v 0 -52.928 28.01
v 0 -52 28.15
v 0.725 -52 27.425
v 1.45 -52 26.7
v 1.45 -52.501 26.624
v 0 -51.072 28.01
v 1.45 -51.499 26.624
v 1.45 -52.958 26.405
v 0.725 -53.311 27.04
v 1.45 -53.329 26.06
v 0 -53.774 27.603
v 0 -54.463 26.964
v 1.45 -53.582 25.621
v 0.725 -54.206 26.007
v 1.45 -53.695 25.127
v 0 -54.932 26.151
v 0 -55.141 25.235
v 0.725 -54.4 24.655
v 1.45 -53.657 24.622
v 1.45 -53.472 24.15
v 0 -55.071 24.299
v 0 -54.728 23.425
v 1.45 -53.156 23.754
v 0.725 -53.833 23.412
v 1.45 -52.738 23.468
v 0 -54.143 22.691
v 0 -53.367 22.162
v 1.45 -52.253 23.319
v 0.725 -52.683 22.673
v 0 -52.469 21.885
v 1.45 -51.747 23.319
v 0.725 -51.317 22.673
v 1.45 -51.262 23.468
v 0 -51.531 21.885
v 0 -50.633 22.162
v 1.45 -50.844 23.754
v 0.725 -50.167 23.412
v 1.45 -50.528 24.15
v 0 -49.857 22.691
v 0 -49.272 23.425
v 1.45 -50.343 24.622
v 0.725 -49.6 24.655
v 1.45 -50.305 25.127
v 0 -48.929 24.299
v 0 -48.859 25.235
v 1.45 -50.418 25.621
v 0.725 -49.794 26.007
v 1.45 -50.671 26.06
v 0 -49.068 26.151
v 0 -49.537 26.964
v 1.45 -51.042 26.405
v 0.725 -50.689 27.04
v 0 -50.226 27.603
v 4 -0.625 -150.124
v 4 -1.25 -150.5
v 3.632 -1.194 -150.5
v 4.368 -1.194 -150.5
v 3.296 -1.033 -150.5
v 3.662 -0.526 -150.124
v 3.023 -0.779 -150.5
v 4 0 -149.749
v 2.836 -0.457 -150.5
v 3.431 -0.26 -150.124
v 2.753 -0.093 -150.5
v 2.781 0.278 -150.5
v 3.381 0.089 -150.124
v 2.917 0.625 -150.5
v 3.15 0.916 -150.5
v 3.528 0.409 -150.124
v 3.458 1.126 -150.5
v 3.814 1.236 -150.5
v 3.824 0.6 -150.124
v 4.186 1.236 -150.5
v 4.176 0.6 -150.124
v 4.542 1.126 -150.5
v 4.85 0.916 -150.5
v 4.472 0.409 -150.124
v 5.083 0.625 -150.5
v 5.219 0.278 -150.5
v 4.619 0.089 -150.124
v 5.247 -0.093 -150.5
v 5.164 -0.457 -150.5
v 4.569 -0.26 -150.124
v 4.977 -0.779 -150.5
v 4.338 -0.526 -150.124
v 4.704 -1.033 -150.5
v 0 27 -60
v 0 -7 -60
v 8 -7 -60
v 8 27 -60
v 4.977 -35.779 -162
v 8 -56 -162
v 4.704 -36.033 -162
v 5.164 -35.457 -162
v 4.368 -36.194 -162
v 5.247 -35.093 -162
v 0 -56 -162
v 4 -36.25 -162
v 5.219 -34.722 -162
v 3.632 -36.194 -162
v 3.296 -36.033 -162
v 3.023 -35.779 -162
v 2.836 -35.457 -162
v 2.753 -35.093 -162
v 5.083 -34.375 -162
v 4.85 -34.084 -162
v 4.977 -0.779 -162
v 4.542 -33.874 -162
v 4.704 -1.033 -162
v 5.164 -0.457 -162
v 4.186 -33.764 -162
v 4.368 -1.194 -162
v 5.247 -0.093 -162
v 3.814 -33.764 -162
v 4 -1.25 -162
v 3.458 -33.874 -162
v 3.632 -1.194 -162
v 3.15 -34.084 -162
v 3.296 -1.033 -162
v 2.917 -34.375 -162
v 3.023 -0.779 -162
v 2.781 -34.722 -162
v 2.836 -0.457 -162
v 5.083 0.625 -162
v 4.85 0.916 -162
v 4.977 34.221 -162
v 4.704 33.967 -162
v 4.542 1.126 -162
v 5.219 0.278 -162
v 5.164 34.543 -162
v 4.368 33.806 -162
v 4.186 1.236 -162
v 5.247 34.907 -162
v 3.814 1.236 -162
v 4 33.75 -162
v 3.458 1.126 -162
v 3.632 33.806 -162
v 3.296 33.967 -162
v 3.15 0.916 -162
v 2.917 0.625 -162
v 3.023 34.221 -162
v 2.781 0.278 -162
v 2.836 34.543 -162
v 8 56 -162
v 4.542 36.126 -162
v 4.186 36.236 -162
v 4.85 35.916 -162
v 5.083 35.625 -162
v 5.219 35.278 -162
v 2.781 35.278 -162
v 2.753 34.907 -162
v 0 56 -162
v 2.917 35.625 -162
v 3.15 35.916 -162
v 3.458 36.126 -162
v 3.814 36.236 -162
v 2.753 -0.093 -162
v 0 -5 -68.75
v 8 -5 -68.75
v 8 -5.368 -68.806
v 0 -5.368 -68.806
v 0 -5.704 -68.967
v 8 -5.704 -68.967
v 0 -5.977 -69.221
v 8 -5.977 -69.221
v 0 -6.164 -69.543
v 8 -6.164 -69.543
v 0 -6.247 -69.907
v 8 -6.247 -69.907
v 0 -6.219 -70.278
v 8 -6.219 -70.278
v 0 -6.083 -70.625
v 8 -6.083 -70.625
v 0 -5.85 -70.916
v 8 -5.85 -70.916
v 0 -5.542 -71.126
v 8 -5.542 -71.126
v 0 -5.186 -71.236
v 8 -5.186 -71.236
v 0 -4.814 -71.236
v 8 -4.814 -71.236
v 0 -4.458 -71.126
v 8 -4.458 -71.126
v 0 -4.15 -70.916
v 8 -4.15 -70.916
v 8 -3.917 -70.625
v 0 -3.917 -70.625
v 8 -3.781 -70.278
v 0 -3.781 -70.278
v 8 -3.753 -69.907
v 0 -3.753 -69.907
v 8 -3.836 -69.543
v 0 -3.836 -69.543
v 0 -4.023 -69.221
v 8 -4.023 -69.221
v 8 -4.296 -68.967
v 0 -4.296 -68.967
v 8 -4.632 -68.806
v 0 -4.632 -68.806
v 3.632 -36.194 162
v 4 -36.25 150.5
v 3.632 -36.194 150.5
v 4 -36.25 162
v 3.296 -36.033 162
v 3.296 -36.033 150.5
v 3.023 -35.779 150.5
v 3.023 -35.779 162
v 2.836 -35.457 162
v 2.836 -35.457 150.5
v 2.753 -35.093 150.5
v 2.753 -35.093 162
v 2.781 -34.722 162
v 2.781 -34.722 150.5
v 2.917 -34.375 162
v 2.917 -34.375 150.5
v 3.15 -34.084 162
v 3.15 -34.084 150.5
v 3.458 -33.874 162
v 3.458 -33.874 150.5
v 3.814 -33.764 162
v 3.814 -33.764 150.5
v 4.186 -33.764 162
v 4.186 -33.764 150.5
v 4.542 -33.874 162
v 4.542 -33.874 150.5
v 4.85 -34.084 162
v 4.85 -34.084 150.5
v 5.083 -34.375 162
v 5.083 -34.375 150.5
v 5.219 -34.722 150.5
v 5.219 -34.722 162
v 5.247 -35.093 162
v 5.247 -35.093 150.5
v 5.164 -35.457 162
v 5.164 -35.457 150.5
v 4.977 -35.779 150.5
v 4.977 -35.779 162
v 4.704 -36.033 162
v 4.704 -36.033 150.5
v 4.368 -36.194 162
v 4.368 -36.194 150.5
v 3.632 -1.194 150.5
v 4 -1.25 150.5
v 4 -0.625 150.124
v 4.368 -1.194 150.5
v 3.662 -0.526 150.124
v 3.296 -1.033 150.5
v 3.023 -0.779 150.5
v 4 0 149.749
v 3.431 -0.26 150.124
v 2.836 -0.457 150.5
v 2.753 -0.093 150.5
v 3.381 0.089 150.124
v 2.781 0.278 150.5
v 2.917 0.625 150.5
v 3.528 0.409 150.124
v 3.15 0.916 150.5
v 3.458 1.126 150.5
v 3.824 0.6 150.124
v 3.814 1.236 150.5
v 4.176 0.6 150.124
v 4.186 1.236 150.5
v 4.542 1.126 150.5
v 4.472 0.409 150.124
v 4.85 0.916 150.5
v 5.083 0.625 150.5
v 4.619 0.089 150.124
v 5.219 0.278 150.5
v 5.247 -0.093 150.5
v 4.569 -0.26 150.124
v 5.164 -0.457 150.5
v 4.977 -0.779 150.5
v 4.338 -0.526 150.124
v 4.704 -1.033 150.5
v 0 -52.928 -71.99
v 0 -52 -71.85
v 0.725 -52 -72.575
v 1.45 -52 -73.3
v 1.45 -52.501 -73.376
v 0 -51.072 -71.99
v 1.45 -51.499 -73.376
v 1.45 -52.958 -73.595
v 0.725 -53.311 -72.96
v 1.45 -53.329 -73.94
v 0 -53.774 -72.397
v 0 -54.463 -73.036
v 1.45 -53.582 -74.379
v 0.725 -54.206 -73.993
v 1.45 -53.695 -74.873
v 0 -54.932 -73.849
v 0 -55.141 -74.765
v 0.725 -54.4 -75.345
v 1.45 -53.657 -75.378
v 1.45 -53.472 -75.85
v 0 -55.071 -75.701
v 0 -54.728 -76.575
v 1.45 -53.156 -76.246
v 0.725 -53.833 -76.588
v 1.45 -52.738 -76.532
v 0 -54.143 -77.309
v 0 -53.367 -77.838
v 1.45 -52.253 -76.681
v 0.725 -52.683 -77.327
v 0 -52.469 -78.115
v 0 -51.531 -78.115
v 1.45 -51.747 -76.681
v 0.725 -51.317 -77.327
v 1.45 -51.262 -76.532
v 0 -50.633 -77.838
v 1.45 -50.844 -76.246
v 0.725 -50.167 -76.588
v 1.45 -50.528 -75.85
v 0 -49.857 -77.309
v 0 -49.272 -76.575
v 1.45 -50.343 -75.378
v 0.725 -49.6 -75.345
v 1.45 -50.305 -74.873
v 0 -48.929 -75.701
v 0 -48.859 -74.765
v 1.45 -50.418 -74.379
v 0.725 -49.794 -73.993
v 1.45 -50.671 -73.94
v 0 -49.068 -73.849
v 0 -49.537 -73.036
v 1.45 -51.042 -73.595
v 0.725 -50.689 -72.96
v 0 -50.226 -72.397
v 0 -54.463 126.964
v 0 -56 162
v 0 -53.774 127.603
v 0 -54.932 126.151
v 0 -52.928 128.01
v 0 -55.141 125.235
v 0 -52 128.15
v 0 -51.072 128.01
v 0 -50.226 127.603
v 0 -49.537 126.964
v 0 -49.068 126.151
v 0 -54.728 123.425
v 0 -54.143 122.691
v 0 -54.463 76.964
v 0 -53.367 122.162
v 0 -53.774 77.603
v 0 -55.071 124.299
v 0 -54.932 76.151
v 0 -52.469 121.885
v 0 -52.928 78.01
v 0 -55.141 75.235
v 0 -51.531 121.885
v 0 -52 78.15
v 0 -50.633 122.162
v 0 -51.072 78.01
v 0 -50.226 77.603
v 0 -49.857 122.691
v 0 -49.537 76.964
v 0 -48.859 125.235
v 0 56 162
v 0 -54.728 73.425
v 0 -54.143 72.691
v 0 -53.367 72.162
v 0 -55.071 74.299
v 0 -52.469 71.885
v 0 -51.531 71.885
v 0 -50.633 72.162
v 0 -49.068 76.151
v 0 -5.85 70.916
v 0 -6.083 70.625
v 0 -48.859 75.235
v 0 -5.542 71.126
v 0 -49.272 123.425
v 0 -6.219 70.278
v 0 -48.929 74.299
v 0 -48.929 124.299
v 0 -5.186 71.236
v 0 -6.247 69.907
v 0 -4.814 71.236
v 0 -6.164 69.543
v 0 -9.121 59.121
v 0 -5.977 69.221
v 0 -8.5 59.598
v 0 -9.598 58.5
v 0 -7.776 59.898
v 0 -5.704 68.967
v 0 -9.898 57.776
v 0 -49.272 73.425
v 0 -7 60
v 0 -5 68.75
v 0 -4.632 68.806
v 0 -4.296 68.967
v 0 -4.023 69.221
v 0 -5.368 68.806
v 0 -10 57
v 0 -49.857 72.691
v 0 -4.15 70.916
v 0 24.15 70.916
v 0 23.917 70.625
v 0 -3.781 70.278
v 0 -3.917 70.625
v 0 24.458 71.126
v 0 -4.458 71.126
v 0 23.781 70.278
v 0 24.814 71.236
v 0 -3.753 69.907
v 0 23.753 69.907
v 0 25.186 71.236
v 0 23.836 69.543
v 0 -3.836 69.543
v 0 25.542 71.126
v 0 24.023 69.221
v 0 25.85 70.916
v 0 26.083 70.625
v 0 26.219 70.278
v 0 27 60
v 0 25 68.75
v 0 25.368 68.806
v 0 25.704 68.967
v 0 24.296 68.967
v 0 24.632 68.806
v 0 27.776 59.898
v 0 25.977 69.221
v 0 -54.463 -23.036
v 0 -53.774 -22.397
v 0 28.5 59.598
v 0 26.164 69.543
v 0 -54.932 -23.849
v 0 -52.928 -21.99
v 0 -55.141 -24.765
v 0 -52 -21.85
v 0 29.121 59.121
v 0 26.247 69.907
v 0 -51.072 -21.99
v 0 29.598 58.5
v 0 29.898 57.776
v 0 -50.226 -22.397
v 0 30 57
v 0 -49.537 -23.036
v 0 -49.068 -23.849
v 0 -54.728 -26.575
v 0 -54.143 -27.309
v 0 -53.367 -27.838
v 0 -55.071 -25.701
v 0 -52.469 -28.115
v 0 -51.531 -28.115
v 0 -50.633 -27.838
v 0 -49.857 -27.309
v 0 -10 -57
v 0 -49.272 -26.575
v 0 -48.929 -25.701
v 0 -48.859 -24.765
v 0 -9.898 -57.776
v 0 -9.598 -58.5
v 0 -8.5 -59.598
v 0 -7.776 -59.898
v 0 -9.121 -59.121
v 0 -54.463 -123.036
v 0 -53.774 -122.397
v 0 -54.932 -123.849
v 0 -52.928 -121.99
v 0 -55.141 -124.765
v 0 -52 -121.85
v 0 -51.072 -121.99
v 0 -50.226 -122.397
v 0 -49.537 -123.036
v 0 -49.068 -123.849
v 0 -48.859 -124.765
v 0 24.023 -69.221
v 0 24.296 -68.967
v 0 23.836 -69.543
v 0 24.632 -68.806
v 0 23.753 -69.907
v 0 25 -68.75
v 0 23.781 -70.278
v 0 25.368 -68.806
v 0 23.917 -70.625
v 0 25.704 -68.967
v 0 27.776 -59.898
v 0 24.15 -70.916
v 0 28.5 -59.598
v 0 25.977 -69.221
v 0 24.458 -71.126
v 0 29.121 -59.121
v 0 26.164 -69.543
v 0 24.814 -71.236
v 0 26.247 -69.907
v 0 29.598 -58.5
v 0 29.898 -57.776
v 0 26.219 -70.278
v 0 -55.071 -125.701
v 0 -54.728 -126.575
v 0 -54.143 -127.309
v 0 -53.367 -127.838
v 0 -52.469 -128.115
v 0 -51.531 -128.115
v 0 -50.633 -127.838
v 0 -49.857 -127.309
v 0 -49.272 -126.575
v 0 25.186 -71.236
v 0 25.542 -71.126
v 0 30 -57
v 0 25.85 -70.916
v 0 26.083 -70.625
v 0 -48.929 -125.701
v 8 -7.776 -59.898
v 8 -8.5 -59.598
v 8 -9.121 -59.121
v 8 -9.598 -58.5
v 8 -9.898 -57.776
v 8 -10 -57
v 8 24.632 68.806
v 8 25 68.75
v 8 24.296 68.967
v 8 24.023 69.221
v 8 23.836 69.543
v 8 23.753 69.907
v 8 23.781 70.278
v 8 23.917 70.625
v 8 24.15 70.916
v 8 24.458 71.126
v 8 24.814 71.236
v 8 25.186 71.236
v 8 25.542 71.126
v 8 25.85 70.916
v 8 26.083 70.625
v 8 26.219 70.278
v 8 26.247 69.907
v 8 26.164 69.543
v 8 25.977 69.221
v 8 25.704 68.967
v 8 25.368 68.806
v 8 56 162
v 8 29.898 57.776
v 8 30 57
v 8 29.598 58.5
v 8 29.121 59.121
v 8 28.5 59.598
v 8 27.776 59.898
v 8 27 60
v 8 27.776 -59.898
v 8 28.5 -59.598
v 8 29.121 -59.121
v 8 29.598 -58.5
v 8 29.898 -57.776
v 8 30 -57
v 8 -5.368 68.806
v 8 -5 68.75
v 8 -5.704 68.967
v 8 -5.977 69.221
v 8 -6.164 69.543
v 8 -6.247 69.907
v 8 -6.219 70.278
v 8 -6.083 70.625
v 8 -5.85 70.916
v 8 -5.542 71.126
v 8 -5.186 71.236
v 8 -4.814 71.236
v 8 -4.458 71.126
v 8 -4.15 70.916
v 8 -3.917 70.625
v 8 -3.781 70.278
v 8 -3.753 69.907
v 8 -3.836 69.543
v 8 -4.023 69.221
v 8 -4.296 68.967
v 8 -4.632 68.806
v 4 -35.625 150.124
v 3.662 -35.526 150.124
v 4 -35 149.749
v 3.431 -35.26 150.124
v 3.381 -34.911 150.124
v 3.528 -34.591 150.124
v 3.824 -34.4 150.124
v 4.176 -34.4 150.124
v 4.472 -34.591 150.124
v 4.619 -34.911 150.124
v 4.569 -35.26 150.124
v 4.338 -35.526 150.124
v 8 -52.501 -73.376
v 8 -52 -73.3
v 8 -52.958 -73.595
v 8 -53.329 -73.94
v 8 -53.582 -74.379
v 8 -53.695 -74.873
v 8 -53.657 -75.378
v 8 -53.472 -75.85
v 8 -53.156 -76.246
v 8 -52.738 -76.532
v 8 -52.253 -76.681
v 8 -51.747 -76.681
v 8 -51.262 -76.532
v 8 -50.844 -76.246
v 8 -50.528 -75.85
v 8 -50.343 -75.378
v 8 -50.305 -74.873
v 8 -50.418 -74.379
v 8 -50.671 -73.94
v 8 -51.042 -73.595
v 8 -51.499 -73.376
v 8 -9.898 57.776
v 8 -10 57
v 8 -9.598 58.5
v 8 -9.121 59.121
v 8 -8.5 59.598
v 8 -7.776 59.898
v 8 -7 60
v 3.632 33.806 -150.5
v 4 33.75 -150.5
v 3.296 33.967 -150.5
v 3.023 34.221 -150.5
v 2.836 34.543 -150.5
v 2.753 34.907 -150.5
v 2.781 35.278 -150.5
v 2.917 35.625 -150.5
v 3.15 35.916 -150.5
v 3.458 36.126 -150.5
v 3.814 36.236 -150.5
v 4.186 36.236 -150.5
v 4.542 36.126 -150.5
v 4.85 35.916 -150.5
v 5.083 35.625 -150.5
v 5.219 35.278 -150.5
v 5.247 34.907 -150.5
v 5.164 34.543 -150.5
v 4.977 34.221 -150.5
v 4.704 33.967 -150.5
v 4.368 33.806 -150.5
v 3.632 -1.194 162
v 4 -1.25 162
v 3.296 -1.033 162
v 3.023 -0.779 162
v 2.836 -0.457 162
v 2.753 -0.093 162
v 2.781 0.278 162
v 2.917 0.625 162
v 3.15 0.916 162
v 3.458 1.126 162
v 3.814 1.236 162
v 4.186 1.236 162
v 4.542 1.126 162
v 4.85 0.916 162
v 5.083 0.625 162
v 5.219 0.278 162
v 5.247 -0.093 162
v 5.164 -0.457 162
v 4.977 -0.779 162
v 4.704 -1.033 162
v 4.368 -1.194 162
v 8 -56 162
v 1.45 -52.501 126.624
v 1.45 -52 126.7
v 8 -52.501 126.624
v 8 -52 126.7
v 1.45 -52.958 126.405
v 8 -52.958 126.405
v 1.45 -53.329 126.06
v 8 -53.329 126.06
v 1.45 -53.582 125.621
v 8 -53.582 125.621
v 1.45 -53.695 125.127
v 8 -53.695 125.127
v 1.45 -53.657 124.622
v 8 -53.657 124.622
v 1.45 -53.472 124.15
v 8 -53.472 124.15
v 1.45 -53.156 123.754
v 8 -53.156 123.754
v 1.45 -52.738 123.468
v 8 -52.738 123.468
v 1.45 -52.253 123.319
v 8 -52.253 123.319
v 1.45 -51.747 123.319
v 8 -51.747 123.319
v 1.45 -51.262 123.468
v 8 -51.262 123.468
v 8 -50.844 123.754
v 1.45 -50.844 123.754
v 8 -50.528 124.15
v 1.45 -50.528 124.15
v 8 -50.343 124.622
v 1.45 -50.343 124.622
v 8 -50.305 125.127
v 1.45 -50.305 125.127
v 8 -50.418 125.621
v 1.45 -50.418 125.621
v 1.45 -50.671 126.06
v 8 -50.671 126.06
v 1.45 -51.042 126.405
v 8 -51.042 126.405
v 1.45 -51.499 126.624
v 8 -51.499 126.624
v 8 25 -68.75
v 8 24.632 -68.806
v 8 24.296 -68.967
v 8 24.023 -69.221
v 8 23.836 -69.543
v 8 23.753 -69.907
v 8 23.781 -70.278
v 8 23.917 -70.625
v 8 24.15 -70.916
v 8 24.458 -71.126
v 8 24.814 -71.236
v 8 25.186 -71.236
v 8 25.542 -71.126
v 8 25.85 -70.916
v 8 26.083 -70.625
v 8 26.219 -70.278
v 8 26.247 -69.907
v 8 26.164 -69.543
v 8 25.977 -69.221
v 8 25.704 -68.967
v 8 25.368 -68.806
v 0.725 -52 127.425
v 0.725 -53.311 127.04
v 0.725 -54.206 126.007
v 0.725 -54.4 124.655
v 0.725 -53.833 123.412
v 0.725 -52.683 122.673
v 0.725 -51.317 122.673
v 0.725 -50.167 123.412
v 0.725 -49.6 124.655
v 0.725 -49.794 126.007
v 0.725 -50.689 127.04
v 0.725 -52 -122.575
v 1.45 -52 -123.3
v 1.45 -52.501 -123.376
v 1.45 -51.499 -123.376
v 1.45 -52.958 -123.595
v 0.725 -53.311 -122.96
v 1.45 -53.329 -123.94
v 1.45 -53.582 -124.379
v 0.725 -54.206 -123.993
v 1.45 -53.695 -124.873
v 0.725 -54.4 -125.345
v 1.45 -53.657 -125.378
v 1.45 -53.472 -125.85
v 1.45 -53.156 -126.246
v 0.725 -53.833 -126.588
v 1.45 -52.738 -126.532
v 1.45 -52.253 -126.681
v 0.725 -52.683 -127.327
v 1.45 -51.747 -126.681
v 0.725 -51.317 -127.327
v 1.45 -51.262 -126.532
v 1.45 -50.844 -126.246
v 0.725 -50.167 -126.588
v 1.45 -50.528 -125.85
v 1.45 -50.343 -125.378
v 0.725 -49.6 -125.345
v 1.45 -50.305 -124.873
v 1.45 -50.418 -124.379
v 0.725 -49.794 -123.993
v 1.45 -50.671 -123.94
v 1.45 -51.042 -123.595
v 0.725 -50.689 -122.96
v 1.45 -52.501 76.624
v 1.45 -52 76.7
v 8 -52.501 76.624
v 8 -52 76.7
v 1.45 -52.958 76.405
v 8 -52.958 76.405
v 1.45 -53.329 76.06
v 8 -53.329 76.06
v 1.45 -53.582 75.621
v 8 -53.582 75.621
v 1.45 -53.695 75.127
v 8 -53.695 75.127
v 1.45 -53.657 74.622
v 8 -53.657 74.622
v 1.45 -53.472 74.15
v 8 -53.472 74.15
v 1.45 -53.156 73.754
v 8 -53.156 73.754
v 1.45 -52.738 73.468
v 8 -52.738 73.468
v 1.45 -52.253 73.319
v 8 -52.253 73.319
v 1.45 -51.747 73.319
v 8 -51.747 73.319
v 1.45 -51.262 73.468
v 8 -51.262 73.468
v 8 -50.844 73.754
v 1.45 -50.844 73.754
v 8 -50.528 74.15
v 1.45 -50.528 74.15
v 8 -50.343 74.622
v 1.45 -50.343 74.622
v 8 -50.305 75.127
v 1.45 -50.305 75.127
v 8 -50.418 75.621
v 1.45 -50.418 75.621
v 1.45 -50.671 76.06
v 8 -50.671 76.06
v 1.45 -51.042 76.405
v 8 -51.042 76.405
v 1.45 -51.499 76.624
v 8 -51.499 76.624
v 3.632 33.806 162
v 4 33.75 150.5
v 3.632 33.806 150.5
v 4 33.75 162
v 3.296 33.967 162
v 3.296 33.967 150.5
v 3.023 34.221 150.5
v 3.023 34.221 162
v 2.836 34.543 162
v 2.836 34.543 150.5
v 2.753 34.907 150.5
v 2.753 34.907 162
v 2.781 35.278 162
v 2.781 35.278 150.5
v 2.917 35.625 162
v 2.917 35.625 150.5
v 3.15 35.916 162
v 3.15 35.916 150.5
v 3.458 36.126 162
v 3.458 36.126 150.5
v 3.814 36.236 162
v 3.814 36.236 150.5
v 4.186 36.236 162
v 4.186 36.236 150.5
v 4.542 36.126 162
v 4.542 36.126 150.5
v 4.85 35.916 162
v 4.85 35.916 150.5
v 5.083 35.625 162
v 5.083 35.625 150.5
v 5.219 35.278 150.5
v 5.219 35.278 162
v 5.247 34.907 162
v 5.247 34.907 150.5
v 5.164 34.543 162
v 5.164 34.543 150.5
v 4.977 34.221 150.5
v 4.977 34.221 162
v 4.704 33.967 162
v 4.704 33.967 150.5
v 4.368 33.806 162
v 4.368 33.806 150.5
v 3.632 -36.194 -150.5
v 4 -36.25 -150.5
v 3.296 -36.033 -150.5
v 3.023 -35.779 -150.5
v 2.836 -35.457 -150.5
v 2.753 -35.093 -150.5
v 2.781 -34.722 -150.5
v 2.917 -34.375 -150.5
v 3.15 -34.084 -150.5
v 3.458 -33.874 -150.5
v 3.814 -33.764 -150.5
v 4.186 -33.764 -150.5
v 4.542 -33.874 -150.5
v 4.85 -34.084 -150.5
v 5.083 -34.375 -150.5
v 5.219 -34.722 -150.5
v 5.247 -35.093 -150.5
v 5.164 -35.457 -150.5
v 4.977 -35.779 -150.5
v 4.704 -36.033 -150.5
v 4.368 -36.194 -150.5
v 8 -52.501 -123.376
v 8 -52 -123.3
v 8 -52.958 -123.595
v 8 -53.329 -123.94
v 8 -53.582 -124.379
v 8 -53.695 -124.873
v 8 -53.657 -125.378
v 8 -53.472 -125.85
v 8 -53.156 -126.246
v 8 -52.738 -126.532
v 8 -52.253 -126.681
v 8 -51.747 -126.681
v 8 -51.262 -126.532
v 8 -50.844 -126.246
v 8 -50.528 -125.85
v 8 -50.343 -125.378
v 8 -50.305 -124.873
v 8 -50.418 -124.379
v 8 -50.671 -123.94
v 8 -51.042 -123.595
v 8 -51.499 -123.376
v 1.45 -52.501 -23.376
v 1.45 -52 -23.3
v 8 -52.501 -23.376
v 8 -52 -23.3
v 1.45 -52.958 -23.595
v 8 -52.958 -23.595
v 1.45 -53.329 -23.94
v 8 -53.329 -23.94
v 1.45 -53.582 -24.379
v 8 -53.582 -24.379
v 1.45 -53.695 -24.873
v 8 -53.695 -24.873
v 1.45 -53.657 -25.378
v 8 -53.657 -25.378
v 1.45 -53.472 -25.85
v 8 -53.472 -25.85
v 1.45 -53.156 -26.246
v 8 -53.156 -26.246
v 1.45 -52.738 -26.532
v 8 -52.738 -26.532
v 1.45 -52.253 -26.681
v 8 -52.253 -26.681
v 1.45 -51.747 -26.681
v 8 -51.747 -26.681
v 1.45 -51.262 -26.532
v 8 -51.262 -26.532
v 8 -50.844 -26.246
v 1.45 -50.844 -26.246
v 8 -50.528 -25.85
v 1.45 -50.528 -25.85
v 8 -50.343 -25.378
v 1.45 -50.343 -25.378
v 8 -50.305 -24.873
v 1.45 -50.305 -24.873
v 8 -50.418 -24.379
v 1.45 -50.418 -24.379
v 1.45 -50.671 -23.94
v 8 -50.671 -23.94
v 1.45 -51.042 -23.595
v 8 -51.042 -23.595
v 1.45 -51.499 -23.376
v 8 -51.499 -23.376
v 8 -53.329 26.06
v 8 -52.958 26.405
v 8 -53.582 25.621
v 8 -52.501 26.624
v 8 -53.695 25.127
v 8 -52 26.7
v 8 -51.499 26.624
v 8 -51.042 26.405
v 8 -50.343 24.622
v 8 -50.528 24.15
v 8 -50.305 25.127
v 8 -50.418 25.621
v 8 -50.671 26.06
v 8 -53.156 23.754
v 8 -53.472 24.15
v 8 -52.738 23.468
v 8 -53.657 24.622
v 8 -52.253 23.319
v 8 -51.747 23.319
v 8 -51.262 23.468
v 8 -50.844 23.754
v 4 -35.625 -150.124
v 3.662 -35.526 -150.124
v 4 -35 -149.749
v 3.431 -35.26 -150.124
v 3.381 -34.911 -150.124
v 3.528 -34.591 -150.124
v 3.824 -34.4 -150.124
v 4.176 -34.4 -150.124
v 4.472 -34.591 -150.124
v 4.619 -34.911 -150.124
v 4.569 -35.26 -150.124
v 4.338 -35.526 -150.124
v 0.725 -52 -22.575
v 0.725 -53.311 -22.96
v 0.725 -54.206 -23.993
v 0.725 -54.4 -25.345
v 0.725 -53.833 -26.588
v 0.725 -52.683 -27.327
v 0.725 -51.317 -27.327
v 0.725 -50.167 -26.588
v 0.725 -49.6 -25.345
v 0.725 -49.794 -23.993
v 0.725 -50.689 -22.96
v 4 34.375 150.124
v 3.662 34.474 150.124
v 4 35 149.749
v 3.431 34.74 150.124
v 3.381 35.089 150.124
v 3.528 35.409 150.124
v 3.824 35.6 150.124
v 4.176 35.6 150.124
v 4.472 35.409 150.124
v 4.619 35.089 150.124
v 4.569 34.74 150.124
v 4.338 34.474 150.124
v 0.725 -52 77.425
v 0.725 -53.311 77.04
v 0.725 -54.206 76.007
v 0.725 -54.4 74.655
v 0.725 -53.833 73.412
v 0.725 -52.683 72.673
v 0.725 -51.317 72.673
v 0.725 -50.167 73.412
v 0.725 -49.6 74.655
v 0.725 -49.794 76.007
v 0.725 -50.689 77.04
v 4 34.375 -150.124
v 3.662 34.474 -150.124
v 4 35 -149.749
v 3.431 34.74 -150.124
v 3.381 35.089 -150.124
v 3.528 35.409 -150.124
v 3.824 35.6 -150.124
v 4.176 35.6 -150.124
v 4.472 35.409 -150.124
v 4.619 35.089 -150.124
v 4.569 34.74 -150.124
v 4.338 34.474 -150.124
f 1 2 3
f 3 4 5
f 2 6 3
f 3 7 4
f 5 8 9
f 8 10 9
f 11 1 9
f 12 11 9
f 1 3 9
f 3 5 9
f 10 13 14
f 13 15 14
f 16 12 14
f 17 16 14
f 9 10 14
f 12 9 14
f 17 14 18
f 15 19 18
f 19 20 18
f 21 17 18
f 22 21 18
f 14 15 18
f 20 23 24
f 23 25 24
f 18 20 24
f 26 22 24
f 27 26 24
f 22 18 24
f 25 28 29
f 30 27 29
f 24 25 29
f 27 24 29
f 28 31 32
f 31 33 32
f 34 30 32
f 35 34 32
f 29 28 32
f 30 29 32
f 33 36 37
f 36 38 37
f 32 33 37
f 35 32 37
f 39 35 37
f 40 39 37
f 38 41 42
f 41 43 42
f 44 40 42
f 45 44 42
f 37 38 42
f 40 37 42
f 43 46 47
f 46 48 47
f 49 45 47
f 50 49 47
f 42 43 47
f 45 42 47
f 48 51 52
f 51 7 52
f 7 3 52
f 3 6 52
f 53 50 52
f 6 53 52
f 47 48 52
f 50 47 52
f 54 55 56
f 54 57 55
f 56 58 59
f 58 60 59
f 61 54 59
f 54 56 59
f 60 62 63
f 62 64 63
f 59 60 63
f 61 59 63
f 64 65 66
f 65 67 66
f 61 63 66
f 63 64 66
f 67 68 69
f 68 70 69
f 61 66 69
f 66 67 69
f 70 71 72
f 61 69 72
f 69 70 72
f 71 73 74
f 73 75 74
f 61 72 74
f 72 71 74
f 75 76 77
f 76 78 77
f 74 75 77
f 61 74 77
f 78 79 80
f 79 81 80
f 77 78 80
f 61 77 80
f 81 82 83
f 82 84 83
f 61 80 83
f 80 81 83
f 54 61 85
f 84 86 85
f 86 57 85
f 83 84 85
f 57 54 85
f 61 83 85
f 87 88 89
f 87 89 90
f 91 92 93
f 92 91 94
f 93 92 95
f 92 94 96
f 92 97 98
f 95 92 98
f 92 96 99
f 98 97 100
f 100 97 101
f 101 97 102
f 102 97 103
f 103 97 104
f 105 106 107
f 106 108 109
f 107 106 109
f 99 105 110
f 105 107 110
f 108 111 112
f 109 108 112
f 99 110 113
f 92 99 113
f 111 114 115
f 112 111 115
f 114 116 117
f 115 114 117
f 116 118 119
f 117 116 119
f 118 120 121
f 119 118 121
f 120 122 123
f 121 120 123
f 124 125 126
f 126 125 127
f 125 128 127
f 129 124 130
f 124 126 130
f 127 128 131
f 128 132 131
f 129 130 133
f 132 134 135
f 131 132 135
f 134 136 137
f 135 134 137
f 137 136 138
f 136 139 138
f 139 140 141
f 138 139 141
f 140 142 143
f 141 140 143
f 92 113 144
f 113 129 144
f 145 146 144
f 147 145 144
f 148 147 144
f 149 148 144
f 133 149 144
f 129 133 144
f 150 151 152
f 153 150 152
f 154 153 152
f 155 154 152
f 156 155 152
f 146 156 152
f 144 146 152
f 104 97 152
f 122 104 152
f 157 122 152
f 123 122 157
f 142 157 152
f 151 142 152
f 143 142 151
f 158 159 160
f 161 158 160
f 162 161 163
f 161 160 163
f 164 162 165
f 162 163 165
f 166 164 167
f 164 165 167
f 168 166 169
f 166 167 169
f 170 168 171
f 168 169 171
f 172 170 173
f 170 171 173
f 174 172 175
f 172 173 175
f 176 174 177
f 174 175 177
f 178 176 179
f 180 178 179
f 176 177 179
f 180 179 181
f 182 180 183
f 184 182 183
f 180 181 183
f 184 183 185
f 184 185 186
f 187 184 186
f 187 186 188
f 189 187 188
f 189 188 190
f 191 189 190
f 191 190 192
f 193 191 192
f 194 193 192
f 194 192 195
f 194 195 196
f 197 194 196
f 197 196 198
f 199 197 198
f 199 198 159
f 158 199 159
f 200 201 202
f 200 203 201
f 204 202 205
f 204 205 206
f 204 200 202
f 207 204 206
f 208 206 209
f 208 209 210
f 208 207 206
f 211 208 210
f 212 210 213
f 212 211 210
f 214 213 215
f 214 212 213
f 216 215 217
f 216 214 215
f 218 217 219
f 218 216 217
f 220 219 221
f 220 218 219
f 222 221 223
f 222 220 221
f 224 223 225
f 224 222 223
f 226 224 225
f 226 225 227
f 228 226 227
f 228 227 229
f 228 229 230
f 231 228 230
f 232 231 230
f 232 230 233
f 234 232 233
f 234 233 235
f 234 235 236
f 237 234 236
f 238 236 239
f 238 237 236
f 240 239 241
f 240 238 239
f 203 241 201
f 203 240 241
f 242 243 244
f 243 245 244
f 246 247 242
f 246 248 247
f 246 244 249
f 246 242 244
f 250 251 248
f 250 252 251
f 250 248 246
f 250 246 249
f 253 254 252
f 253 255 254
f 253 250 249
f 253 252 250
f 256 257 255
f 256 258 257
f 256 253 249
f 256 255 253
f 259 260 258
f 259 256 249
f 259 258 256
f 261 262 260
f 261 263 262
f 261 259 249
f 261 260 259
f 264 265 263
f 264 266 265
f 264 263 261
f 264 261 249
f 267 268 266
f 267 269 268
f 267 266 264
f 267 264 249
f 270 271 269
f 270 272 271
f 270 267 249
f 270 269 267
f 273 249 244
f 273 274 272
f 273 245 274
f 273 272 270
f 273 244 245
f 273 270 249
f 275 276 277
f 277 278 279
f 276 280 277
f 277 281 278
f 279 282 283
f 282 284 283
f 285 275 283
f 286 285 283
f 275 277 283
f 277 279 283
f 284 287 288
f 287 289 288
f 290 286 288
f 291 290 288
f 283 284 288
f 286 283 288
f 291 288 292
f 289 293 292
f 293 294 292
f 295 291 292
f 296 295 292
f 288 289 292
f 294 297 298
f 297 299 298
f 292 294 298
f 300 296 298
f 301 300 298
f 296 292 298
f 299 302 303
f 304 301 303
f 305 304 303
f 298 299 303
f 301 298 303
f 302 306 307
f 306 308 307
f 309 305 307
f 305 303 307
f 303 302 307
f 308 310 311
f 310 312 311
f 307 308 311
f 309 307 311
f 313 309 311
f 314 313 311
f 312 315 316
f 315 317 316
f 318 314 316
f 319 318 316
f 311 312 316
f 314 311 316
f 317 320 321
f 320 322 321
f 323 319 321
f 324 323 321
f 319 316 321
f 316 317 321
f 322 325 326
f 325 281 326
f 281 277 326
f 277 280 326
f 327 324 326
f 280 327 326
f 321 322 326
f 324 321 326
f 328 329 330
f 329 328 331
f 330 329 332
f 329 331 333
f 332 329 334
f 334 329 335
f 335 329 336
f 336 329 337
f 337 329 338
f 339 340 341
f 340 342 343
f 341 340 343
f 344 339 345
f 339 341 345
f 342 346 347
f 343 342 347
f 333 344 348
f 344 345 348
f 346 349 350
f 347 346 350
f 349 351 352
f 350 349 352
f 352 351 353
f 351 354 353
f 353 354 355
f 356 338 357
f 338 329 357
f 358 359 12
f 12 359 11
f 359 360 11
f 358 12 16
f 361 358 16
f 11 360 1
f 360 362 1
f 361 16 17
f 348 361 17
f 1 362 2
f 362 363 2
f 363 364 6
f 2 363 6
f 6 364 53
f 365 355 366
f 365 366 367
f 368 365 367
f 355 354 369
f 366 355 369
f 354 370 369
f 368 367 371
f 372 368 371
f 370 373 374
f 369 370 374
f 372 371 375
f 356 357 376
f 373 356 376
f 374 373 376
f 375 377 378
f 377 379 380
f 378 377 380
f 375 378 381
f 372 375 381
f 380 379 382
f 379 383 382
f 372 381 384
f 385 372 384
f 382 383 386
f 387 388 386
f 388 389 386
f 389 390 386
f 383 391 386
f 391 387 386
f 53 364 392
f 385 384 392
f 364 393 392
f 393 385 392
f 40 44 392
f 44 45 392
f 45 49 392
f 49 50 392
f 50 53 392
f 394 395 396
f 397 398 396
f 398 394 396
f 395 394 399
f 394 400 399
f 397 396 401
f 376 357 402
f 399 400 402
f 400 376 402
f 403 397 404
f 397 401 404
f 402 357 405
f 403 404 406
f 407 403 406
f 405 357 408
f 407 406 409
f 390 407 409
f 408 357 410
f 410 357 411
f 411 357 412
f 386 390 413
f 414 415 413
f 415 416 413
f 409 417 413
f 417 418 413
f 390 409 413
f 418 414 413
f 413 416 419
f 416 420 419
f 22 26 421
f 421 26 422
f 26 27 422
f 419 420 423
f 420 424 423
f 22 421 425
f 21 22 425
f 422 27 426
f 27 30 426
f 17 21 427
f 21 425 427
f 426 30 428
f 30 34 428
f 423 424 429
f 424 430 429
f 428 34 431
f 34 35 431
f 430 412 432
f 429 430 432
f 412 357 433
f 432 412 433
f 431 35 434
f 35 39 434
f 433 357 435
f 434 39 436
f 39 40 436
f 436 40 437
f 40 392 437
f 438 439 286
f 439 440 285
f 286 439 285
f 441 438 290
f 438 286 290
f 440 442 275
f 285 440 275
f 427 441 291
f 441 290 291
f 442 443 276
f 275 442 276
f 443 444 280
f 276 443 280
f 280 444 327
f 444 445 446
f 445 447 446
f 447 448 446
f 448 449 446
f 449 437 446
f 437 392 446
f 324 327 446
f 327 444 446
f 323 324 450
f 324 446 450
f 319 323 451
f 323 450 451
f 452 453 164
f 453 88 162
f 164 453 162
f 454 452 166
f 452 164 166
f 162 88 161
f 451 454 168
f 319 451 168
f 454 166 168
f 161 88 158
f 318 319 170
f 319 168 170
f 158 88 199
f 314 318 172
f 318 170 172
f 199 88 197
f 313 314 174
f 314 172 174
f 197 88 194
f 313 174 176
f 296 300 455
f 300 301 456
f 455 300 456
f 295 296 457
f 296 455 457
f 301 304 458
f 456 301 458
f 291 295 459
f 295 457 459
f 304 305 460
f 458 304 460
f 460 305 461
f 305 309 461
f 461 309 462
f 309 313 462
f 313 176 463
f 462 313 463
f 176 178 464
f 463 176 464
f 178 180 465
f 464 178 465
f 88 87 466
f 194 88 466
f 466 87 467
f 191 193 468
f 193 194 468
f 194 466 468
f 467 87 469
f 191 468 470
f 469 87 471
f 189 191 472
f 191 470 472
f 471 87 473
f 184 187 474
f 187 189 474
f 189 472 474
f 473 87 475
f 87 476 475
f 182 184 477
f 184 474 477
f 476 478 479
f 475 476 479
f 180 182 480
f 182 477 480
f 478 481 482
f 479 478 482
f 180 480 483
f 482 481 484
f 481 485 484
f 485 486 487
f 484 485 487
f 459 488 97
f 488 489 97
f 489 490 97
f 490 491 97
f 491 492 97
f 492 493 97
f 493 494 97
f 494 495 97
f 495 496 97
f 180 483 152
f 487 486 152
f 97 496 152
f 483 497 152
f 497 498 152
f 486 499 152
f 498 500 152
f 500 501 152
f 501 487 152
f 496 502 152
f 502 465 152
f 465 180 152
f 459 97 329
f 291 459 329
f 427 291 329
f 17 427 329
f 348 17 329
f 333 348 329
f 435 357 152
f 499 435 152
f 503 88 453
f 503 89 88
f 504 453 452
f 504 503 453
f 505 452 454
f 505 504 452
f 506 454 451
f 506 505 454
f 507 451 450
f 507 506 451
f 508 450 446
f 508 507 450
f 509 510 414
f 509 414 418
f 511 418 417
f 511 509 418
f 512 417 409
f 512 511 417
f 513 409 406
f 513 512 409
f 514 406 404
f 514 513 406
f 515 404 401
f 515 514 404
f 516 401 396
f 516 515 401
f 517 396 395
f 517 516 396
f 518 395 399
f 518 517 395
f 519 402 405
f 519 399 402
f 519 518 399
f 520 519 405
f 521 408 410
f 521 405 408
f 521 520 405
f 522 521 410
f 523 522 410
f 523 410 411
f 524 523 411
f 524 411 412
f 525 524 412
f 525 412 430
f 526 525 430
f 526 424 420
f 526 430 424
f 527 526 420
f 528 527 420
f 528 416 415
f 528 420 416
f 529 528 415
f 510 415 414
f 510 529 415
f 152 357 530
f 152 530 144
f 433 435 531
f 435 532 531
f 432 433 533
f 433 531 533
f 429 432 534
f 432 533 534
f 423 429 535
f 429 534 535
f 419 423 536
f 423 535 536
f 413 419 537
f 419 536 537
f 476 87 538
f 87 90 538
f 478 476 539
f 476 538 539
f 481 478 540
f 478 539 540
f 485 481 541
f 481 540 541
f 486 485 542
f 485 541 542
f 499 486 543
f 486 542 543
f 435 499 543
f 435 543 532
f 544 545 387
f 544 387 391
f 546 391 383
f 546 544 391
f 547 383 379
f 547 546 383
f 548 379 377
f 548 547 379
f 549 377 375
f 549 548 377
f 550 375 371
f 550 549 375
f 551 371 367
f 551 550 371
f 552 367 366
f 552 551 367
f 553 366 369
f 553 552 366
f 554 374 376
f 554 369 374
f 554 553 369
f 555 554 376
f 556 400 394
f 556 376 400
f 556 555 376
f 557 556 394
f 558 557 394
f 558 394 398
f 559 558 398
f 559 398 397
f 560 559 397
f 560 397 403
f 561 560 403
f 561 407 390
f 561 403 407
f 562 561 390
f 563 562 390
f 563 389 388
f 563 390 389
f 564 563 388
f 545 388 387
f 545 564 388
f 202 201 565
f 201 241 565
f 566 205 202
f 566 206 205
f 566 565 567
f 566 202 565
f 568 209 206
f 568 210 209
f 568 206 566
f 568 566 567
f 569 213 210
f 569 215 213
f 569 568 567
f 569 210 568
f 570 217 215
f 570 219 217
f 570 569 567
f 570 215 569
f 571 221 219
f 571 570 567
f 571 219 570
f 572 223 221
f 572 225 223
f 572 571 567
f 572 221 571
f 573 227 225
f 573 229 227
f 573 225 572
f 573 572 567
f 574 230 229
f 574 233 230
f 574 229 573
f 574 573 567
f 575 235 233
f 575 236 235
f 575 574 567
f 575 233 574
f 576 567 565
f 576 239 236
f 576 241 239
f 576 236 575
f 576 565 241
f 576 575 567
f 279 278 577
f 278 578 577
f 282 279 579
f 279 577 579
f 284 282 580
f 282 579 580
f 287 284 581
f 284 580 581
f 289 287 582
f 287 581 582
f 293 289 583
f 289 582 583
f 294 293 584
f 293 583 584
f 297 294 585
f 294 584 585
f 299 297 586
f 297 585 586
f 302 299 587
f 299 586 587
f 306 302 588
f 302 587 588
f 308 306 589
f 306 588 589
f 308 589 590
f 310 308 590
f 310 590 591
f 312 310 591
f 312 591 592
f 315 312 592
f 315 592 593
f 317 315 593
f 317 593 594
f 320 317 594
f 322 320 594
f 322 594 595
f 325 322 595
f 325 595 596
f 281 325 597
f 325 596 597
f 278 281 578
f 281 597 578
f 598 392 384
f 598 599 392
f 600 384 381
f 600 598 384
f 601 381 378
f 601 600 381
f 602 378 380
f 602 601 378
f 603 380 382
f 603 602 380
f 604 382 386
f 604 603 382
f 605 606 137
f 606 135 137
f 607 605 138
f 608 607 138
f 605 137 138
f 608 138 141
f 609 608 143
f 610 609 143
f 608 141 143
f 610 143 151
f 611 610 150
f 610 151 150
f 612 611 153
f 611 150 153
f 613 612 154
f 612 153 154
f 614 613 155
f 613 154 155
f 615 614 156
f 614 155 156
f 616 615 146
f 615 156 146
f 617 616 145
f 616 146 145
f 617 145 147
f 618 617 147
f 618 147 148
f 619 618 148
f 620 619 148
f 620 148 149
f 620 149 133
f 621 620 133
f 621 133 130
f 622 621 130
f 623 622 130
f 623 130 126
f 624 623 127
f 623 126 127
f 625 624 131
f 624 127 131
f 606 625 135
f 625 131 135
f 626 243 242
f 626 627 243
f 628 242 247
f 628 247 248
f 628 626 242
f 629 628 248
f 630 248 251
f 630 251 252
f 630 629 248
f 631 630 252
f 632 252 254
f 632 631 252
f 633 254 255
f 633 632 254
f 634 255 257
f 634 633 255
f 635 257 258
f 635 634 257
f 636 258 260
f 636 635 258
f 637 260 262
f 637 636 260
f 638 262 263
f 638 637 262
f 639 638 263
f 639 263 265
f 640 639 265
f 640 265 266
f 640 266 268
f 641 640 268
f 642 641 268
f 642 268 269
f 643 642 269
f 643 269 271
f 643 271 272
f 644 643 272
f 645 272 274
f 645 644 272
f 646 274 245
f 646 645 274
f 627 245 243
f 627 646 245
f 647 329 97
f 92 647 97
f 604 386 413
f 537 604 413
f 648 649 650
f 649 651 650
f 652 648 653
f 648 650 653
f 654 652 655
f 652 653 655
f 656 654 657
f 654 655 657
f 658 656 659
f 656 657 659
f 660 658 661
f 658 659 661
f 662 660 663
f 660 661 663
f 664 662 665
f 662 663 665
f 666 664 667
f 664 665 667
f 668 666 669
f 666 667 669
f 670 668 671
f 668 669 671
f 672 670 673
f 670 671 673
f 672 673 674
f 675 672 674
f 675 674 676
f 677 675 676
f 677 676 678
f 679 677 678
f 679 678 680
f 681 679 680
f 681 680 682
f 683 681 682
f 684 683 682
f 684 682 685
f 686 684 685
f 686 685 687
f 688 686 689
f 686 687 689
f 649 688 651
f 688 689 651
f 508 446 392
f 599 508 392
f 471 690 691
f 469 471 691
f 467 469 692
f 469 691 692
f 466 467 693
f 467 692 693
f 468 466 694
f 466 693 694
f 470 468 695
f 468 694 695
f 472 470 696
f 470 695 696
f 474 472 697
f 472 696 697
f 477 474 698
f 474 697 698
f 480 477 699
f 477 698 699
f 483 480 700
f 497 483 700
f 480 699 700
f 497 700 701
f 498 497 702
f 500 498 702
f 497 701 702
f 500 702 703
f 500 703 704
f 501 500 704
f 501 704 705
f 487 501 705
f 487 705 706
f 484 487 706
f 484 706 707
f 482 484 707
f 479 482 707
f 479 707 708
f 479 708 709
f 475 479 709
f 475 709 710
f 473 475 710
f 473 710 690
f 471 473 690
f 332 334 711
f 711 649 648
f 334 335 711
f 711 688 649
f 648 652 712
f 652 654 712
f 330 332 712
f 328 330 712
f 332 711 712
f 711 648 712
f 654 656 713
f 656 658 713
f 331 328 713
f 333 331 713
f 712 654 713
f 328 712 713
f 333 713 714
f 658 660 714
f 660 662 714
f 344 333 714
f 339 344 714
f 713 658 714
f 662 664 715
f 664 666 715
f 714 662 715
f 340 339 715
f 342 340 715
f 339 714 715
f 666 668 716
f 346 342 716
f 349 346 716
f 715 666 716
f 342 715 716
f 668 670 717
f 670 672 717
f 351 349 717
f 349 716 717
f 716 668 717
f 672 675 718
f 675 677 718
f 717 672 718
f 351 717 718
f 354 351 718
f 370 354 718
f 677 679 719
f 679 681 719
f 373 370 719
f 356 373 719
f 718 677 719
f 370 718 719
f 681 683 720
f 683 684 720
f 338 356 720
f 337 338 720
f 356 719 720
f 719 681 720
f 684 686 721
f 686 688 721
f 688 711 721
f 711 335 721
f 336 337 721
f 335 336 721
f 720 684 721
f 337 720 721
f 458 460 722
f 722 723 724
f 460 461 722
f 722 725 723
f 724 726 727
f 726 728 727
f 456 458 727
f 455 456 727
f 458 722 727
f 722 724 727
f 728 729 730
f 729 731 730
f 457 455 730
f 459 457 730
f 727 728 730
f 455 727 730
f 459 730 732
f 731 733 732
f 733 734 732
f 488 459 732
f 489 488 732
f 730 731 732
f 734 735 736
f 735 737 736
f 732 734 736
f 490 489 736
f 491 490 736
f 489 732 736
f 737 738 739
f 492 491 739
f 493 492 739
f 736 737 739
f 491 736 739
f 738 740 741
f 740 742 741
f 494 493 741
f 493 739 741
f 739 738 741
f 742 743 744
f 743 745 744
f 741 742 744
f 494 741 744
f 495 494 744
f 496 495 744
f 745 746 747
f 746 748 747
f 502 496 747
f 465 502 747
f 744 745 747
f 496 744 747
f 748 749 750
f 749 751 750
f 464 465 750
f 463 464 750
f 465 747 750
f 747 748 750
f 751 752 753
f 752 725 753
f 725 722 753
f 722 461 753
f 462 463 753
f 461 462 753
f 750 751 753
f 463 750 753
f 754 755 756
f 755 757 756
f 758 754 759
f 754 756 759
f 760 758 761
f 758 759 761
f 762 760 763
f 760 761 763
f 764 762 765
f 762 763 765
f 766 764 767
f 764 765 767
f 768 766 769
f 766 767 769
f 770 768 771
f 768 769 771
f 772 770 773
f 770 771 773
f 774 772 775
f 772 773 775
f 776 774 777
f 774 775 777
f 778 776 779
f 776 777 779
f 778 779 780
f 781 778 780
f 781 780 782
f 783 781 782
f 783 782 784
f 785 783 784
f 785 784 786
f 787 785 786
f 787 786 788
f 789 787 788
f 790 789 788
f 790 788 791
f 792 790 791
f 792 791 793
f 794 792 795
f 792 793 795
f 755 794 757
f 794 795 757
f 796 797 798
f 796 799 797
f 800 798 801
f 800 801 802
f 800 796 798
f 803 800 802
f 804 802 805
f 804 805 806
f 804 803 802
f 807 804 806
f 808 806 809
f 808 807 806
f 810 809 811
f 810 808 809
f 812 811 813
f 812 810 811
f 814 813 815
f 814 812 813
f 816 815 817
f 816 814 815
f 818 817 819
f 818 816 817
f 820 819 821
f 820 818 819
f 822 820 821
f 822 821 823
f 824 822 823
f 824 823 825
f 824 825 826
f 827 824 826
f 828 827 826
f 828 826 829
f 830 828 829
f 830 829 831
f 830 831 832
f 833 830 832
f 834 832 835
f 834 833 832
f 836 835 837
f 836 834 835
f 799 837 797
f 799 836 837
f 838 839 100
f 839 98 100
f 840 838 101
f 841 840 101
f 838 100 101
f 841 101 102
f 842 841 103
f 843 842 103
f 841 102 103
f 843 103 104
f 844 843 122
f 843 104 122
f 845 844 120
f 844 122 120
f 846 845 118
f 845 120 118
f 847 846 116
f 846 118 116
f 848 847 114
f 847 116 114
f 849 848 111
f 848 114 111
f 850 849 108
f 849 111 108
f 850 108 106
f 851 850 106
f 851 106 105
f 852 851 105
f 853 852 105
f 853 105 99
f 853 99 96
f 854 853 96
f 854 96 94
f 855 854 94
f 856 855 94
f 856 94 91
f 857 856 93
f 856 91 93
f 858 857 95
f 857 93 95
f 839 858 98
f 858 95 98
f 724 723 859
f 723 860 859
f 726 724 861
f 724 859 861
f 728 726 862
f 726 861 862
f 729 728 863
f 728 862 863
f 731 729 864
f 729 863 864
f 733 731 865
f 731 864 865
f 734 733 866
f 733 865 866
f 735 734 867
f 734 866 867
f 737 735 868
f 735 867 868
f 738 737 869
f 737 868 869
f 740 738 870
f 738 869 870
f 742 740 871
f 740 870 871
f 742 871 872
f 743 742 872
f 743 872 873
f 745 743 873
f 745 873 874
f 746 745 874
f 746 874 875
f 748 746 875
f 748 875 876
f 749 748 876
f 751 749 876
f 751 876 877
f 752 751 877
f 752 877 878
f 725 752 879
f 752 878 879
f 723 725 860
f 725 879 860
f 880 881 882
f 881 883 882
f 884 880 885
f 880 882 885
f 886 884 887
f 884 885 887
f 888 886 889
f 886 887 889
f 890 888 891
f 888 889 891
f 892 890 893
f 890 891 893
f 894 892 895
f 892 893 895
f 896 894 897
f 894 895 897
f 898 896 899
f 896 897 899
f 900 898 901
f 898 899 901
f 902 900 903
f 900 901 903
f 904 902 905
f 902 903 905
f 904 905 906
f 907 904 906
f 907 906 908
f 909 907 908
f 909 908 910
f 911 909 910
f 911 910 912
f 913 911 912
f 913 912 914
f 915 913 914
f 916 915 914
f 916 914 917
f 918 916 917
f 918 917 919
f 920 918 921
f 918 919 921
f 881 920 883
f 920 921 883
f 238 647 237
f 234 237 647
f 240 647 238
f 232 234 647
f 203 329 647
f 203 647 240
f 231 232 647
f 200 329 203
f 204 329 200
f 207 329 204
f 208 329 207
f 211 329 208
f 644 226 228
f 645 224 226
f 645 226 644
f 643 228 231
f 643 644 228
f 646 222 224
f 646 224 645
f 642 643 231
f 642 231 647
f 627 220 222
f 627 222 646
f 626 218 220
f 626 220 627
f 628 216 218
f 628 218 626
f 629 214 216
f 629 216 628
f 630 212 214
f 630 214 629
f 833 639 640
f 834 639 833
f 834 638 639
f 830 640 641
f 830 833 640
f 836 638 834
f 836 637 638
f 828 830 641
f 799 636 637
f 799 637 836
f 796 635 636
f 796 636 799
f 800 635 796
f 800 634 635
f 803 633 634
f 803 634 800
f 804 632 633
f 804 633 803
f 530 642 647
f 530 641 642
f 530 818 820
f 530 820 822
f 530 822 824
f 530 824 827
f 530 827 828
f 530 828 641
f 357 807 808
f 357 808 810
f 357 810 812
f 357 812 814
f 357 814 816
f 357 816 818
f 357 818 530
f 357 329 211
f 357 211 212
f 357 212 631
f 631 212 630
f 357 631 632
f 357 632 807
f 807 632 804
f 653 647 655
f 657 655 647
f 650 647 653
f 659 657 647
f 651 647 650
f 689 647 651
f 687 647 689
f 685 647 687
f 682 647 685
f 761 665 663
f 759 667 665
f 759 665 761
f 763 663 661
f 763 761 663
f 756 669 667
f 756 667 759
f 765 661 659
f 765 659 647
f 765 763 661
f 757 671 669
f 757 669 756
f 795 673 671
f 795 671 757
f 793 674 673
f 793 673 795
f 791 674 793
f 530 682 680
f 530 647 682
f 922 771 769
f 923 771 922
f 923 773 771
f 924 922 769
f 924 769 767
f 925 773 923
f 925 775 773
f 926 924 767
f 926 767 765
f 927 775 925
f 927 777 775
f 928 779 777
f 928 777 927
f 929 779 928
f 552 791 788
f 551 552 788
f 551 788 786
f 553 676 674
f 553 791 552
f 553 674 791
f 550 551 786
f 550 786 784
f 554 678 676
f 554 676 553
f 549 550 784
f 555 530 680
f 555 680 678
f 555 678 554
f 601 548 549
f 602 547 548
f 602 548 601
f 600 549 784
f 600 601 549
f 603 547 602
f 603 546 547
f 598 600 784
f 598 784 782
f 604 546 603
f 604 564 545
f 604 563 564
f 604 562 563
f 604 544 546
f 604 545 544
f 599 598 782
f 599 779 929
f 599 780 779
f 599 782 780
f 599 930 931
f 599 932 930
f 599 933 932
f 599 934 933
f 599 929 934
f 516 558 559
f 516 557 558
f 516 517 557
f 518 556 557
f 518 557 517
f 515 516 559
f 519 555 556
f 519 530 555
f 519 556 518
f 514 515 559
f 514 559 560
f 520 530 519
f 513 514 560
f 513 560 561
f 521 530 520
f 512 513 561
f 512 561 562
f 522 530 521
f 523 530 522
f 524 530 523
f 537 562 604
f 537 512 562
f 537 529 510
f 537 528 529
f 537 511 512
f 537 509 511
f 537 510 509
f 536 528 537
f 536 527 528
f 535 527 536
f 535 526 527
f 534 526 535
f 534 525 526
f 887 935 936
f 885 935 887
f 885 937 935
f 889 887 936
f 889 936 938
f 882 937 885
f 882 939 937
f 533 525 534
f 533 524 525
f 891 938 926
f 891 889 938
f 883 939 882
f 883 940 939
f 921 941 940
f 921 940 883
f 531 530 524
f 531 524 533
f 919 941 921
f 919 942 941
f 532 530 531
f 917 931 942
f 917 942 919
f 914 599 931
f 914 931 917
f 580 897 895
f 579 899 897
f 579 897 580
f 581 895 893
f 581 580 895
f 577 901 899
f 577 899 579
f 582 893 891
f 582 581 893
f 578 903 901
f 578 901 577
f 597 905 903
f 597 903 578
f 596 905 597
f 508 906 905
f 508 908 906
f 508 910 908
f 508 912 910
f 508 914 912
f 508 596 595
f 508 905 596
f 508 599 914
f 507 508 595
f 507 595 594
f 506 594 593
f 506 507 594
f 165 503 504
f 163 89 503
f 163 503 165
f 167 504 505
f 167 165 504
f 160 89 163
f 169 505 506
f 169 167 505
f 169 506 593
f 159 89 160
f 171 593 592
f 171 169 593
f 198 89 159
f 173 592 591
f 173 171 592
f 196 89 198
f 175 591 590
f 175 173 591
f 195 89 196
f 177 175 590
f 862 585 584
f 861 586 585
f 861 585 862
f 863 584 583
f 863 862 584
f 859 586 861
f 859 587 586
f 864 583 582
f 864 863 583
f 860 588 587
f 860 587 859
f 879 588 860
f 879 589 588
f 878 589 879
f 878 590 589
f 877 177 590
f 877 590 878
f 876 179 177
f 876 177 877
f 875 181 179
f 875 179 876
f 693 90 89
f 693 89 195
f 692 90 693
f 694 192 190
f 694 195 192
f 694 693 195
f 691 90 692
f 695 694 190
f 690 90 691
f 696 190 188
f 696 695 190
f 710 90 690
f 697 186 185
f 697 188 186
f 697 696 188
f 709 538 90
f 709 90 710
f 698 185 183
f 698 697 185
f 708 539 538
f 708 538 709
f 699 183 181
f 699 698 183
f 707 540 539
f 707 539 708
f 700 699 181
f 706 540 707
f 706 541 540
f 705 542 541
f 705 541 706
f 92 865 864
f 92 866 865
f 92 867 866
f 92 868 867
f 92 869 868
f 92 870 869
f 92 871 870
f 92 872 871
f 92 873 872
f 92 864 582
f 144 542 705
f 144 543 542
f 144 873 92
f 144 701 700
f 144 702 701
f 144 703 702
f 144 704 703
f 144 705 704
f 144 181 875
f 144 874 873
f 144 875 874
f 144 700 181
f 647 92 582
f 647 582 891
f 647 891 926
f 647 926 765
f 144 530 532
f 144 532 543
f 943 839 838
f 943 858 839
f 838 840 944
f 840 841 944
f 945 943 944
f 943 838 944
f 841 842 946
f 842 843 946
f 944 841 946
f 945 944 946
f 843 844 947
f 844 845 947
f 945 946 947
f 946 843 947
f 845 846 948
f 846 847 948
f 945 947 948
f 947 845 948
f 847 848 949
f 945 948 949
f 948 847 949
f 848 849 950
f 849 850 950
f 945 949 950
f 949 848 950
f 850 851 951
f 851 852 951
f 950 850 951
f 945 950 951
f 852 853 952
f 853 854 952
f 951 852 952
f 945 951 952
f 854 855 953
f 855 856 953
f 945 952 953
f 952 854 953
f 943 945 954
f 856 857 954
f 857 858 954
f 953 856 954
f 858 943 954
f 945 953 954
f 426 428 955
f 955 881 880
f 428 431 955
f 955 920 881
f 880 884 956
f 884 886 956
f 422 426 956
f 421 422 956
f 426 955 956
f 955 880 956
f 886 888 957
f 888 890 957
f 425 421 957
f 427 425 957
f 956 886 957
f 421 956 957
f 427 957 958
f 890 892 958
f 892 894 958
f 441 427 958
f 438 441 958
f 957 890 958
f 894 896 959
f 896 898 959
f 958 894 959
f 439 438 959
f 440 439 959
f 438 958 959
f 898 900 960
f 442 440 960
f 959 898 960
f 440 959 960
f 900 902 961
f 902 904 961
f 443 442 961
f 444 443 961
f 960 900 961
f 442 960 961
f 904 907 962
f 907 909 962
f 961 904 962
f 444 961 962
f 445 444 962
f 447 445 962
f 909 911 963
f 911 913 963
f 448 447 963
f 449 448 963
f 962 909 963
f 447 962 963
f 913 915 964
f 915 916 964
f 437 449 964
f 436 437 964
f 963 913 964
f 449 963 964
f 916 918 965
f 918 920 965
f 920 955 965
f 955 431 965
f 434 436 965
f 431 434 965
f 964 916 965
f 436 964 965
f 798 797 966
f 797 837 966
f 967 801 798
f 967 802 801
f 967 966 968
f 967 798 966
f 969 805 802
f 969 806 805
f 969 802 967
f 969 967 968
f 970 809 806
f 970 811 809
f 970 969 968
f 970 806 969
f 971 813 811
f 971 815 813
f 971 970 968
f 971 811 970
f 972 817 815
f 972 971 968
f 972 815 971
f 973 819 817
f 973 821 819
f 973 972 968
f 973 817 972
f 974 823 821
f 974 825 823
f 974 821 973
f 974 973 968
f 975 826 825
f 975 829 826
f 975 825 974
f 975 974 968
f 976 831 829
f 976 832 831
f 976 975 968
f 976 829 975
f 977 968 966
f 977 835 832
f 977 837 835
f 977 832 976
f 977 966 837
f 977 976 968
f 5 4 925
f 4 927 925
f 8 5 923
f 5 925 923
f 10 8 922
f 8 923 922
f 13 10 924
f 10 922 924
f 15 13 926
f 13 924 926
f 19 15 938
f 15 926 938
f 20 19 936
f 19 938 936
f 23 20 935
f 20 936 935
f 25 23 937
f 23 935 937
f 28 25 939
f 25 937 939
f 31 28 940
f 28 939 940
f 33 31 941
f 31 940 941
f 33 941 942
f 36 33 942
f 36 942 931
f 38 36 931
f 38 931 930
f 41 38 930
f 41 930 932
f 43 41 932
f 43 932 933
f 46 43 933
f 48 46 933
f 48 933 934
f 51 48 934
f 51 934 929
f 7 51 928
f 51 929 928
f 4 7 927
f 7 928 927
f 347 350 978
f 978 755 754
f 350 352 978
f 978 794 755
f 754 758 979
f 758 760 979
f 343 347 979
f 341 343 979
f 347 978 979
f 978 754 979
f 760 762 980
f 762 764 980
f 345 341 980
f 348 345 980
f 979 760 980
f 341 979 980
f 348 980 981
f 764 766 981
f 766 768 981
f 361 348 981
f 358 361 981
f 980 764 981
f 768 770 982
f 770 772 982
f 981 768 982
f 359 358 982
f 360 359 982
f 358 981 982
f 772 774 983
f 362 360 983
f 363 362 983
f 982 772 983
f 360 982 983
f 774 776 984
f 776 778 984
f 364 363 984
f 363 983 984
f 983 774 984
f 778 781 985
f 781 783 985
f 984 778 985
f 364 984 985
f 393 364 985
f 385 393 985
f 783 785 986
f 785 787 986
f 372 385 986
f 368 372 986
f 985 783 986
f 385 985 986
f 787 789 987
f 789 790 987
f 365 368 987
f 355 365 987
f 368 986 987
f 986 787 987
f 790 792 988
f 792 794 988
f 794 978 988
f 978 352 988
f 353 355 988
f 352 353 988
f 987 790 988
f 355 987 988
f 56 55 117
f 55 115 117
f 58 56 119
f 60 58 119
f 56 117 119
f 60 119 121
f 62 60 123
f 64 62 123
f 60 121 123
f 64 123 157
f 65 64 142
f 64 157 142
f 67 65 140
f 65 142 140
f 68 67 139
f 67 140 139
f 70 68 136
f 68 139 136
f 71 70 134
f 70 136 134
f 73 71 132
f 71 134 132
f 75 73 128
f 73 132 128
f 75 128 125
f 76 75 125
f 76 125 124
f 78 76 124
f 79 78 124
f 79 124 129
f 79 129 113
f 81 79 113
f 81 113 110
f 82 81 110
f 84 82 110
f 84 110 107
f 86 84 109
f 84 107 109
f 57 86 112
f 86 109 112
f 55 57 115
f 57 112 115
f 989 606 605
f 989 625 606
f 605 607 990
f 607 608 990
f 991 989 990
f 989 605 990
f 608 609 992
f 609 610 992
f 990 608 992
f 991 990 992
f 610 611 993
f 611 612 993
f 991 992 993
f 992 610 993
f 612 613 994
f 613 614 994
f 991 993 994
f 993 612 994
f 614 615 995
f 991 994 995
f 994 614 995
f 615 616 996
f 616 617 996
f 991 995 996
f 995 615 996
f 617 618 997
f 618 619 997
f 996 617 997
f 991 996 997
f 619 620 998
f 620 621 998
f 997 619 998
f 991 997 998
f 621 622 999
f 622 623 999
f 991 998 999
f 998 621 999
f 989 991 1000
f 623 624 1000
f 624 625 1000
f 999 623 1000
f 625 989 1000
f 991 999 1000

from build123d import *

# Parameters (mm, degrees)
SKETCH1_W                                     = 324
SKETCH1_H                                     = 112
BOSS_EXTRUDE1_DEPTH                           = 8
M3X0_5_TAPPED_HOLE1_AT_2_COUNT                = 2
M3X0_5_TAPPED_HOLE1_AT_2_PITCH                = 35
M3X0_5_TAPPED_HOLE1_AT_3_COUNT                = 2
M3X0_5_TAPPED_HOLE1_AT_3_PITCH                = 70
CSK_FOR_M3_COUNTERSUNK_FLAT_HEAD1_D           = 3.4
CSK_FOR_M3_COUNTERSUNK_FLAT_HEAD1_DEPTH       = 11.5
CSK_FOR_M3_COUNTERSUNK_FLAT_HEAD1_CSINK_D     = 6.3
CSK_FOR_M3_COUNTERSUNK_FLAT_HEAD1_CSINK_ANGLE = 90
CSK_FOR_M3_COUNTERSUNK_FLAT_HEAD1_TIP         = 1.021463052
SKETCH9_W                                     = 120
SKETCH9_H                                     = 40
CUT_EXTRUDE1_DEPTH                            = 172.59254063
M3X0_5_TAPPED_HOLE2_D                         = 2.5
FILLET1_R                                     = 3


with BuildPart() as part:
    # Sketch1 → Boss-Extrude1 (new body)
    with BuildSketch(Plane(origin=(0, 0, 0), x_dir=(0, 0, -1), z_dir=(1, 0, 0))):
        Rectangle(SKETCH1_W, SKETCH1_H)
    extrude(amount=BOSS_EXTRUDE1_DEPTH)

    # Sketch4 → M3x0.5 Tapped Hole1 (revolve, cut)
    with BuildSketch(Plane(origin=(4, 35, 162), x_dir=(0, -1, 0), z_dir=(1, 0, 0))):
        Polygon((0, 0), (0, 12.251075774), (1.25, 11.5), (1.25, 0), align=None)
    m3x0_5_tapped_hole1 = revolve(axis=Axis((4, 35, 168.35), (0, 0, -1)), mode=Mode.SUBTRACT)

    # M3x0.5 Tapped Hole1 at 2: M3x0.5 Tapped Hole1 ×2
    with Locations(*[(0, -i * M3X0_5_TAPPED_HOLE1_AT_2_PITCH, 0) for i in range(1, M3X0_5_TAPPED_HOLE1_AT_2_COUNT)]):
        add(m3x0_5_tapped_hole1, mode=Mode.SUBTRACT)

    # M3x0.5 Tapped Hole1 at 3: M3x0.5 Tapped Hole1 ×2
    with Locations(*[(0, -i * M3X0_5_TAPPED_HOLE1_AT_3_PITCH, 0) for i in range(1, M3X0_5_TAPPED_HOLE1_AT_3_COUNT)]):
        add(m3x0_5_tapped_hole1, mode=Mode.SUBTRACT)

    # Mirror1: M3x0.5 Tapped Hole1 across plane
    add(m3x0_5_tapped_hole1.mirror(Plane.XY), mode=Mode.SUBTRACT)

    # Mirror1 copy 1 sketch → Mirror1 copy 1 (revolve, cut)
    with BuildSketch(Plane(origin=(4, 0, -162), x_dir=(0, -1, 0), z_dir=(1, 0, 0))):
        Polygon((0, 0), (0, -12.251075774), (1.25, -11.5), (1.25, 0), align=None)
    revolve(axis=Axis((4, 0, -168.35), (0, 0, -1)), mode=Mode.SUBTRACT)

    # Mirror1 copy 2 sketch → Mirror1 copy 2 (revolve, cut)
    with BuildSketch(Plane(origin=(4, -35, -162), x_dir=(0, -1, 0), z_dir=(1, 0, 0))):
        Polygon((0, 0), (0, -12.251075774), (1.25, -11.5), (1.25, 0), align=None)
    revolve(axis=Axis((4, -35, -168.35), (0, 0, -1)), mode=Mode.SUBTRACT)

    # CSK for M3 Countersunk Flat Head1
    with Locations(Plane(origin=(0, -52, -125), x_dir=(0, 0, -1), z_dir=(-1, 0, 0))):
        with Locations((0, 0), (-50, 0), (-100, 0), (-150, 0), (-200, 0), (-250, 0)):
            CounterSinkHole(CSK_FOR_M3_COUNTERSUNK_FLAT_HEAD1_D / 2, CSK_FOR_M3_COUNTERSUNK_FLAT_HEAD1_CSINK_D / 2, depth=CSK_FOR_M3_COUNTERSUNK_FLAT_HEAD1_DEPTH, counter_sink_angle=CSK_FOR_M3_COUNTERSUNK_FLAT_HEAD1_CSINK_ANGLE)
            with Locations((0, 0, -(CSK_FOR_M3_COUNTERSUNK_FLAT_HEAD1_DEPTH + CSK_FOR_M3_COUNTERSUNK_FLAT_HEAD1_TIP / 2))):  # 118° drill point
                Cone(0, CSK_FOR_M3_COUNTERSUNK_FLAT_HEAD1_D / 2, CSK_FOR_M3_COUNTERSUNK_FLAT_HEAD1_TIP, mode=Mode.SUBTRACT)

    # Sketch9 → Cut-Extrude1 (cut, through all)
    with BuildSketch(Plane.ZY):
        with Locations((0, 10)):
            Rectangle(SKETCH9_W, SKETCH9_H)
    extrude(amount=-CUT_EXTRUDE1_DEPTH, mode=Mode.SUBTRACT)

    # M3x0.5 Tapped Hole2 (through all)
    with Locations(Plane(origin=(0, 25, -70), x_dir=(0, 0, -1), z_dir=(-1, 0, 0))):
        with Locations((0, 0), (0, 30)):
            m3x0_5_tapped_hole2 = Hole(M3X0_5_TAPPED_HOLE2_D / 2)

    # Mirror2: M3x0.5 Tapped Hole2 across plane
    add(m3x0_5_tapped_hole2.mirror(Plane.XY), mode=Mode.SUBTRACT)

    # Fillet1
    fillet1_edges = [part.edges().sort_by_distance(p)[0] for p in [
        (4, -10, -60),
        (4, 30, -60),
        (4, 30, 60),
        (4, -10, 60),
    ]]
    fillet(fillet1_edges, radius=FILLET1_R)


solid = part.part
